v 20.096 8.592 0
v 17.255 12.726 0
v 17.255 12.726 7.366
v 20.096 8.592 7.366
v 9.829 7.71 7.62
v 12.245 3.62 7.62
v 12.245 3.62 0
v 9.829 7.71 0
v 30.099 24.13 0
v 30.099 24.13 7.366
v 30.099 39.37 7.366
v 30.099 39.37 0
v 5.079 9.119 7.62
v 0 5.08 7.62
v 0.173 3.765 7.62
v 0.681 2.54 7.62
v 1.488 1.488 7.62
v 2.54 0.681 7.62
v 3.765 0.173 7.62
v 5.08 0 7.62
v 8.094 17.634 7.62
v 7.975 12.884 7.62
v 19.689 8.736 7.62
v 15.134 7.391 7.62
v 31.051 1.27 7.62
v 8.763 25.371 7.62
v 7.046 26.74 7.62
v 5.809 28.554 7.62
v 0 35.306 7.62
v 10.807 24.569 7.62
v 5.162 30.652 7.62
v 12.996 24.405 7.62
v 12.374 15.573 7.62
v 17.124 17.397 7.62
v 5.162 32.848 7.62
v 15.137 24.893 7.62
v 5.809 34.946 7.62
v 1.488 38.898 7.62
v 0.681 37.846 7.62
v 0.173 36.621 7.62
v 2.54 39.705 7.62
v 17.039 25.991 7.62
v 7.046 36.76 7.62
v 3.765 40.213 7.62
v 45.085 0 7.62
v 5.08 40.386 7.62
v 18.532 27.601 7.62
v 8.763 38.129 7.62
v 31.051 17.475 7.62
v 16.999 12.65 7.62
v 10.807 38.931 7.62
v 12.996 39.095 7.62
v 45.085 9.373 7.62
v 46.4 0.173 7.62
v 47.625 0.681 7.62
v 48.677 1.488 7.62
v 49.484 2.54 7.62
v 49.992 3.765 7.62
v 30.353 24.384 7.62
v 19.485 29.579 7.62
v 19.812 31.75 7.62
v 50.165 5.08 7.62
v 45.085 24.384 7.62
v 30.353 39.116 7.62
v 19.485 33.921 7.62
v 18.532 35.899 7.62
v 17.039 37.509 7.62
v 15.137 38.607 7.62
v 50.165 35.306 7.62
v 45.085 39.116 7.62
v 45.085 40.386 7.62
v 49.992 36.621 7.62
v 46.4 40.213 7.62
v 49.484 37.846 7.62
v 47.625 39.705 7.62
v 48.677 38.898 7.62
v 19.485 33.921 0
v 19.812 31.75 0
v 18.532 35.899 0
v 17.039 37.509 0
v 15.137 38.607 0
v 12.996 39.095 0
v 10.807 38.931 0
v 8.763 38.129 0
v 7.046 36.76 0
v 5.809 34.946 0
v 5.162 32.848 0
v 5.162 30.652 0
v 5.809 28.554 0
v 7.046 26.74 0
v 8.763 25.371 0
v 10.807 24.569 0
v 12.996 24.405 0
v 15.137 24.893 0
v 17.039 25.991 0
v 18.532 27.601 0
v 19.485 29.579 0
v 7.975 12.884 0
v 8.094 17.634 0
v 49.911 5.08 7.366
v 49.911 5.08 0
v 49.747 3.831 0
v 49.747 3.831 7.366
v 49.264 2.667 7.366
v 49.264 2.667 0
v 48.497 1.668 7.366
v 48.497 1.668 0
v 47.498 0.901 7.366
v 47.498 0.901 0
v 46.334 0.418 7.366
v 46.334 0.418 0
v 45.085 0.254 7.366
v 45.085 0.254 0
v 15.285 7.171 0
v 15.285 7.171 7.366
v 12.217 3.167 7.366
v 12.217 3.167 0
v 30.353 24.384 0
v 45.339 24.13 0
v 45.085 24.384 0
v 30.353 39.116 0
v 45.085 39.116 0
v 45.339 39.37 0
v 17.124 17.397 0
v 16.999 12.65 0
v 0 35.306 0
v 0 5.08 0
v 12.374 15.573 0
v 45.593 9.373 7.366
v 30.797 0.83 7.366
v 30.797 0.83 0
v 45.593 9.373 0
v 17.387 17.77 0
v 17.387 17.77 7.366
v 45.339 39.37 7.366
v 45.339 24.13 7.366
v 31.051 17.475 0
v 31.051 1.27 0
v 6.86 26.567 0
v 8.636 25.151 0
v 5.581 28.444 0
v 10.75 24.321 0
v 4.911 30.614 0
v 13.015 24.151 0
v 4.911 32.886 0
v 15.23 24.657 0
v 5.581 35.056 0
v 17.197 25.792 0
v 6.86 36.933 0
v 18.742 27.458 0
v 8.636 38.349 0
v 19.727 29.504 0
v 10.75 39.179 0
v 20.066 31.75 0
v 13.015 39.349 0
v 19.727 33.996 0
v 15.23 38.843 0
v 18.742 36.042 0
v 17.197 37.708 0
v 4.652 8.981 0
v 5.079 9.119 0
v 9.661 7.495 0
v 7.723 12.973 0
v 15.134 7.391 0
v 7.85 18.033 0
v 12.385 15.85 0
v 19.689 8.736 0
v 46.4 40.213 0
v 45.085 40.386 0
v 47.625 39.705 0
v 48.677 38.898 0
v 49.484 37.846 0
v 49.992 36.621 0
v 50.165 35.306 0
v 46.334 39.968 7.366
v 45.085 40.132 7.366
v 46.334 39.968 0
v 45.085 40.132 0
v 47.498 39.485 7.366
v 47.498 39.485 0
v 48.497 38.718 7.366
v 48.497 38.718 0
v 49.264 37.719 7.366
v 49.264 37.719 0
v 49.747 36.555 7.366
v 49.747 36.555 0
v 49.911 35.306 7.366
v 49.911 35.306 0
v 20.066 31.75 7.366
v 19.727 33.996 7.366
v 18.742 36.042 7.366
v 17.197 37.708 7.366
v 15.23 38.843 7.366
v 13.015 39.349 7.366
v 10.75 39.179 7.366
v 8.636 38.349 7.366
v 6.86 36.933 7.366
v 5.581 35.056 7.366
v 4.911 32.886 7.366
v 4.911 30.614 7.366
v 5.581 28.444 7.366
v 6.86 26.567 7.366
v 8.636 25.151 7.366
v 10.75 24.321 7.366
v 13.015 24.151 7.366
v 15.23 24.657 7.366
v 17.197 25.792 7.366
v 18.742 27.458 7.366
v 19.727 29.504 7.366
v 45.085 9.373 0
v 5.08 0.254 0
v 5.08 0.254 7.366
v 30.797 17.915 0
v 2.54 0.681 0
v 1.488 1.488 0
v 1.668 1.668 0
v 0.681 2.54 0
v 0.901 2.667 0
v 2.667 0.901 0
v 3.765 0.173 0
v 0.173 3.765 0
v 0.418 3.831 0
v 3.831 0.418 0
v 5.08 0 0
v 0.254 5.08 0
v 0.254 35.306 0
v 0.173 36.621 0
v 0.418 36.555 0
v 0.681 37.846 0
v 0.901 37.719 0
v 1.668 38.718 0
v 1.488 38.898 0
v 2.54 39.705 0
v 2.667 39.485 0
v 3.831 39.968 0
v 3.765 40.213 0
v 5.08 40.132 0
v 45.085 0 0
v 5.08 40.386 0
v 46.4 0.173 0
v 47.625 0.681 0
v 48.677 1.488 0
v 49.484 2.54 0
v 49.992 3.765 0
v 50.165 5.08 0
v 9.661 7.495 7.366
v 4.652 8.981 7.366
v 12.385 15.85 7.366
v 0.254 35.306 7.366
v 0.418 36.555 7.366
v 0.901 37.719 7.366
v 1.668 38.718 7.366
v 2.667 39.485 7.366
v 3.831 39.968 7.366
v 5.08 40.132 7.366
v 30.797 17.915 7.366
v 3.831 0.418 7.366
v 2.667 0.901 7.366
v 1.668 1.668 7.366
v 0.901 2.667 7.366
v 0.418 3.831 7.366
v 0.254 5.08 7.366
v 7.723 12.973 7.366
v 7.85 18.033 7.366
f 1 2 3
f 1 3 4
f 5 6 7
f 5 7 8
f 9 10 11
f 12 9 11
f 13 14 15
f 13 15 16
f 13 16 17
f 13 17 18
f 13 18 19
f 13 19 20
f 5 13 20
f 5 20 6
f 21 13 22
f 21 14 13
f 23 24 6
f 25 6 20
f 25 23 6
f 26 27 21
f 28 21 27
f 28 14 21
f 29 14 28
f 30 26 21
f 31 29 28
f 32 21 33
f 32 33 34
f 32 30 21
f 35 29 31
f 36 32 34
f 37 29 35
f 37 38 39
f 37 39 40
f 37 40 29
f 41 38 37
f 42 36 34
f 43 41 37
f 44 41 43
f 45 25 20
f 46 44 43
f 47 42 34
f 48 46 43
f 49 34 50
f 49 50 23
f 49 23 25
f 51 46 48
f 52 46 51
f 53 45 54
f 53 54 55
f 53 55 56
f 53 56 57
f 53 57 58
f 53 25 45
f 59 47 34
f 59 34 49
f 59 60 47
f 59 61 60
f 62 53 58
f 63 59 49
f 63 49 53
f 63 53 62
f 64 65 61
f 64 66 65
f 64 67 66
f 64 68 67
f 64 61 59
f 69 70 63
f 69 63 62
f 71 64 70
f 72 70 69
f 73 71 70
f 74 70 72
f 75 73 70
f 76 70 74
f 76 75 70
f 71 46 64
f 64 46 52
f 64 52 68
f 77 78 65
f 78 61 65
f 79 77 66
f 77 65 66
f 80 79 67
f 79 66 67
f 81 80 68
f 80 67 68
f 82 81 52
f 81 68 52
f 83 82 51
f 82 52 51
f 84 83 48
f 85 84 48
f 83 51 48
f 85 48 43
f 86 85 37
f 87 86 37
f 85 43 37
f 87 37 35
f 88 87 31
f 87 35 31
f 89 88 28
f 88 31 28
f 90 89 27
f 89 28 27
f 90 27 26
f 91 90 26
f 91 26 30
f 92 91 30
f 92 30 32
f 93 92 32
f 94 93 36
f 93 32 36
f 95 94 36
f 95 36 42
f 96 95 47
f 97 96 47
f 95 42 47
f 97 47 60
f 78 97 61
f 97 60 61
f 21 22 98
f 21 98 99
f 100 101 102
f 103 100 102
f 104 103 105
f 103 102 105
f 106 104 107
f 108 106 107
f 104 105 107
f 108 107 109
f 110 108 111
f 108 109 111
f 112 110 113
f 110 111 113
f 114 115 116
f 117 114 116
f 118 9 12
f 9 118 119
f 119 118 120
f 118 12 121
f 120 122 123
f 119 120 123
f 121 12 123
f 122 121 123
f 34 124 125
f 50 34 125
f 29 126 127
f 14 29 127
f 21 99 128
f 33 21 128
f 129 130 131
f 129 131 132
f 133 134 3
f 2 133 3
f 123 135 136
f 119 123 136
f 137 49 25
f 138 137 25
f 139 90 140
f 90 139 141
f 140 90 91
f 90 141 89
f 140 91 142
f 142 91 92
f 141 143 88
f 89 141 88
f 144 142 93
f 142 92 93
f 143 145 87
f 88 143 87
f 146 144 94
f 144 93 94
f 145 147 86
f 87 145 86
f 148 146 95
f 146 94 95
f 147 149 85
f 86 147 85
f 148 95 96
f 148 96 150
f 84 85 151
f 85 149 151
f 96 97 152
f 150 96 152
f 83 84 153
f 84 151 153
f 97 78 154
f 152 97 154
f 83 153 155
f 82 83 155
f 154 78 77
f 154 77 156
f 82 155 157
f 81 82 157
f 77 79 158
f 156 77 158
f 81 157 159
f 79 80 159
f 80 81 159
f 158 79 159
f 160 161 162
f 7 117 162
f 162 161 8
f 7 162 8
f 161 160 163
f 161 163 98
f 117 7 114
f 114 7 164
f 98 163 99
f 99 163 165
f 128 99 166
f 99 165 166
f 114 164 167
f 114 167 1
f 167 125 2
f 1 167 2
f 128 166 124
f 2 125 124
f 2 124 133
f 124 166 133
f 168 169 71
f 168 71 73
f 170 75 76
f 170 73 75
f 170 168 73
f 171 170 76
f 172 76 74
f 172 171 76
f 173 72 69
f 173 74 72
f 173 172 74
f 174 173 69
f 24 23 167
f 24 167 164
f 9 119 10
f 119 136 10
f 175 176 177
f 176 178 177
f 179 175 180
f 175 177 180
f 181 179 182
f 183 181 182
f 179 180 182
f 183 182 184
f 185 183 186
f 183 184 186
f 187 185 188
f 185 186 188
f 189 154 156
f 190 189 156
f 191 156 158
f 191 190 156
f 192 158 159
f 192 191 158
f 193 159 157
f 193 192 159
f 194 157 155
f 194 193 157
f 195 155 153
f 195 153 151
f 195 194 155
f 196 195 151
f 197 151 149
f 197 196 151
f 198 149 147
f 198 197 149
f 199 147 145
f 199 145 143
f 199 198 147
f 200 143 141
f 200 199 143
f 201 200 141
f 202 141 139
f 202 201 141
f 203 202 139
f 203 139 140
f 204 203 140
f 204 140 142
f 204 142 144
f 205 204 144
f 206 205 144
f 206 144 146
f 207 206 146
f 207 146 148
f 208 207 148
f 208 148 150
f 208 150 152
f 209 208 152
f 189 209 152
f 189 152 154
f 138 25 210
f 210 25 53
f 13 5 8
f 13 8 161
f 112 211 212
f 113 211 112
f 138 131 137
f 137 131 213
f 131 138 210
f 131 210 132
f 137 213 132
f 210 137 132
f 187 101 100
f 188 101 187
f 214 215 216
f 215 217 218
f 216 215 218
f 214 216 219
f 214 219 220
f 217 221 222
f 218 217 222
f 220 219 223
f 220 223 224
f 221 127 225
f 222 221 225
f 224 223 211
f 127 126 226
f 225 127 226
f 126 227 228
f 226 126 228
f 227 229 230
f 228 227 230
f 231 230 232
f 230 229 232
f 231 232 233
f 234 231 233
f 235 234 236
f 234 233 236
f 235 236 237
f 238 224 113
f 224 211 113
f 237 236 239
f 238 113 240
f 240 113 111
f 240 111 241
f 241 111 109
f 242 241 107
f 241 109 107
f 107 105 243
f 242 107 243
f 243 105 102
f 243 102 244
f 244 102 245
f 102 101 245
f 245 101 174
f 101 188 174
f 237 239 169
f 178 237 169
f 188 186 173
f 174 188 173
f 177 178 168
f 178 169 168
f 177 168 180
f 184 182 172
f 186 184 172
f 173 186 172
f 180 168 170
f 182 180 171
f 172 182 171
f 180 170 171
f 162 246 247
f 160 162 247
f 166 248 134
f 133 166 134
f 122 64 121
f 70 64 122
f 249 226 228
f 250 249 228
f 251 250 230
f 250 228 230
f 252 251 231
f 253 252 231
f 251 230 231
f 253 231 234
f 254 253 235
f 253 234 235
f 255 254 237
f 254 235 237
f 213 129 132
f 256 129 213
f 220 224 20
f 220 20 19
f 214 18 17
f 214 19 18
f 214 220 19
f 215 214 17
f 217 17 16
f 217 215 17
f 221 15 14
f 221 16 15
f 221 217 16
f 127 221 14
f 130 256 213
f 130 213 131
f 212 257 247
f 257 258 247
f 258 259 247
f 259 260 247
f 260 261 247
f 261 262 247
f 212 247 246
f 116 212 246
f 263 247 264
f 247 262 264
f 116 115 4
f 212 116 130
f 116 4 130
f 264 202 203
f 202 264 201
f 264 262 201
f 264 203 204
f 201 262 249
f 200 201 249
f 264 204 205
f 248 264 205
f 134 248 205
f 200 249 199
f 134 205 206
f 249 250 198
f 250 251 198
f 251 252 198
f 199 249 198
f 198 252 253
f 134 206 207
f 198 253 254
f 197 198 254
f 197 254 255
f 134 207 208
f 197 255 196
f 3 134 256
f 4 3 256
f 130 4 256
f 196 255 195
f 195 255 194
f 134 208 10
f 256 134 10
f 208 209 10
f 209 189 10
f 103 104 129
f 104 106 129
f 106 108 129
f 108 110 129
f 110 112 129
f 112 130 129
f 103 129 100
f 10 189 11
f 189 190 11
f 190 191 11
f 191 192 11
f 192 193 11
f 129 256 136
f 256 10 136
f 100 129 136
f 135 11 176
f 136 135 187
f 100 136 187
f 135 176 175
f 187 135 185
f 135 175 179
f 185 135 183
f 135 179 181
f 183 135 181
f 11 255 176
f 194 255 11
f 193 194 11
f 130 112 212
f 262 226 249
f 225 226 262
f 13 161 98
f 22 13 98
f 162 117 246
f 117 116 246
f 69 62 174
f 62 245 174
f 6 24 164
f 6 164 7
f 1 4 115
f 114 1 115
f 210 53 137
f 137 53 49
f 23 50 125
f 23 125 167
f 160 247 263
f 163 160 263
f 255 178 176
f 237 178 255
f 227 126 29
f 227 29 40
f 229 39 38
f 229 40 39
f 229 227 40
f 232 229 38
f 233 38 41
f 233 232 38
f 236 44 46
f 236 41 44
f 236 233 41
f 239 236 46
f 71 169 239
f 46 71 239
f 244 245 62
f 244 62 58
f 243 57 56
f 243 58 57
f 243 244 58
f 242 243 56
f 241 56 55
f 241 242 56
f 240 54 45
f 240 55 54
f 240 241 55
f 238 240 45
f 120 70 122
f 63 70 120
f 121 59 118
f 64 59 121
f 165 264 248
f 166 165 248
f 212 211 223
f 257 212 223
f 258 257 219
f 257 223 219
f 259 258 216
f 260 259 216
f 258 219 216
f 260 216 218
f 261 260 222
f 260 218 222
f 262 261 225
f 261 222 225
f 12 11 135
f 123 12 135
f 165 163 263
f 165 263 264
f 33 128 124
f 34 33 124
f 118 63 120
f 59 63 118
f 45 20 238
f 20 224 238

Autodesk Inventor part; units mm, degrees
ref_plane "YZ Plane" through (0, 0, 0) normal (1, 0, 0) x (0, 1, 0)
ref_plane "XZ Plane" through (0, 0, 0) normal (0, 1, 0) x (-1, 0, 0)
ref_plane "XY Plane" through (0, 0, 0) normal (0, 0, 1) x (1, 0, 0)
sketch "Sketch1" plane through (0, 0, 0) normal (0, 0, 1) x (1, 0, 0)
  line L0 (5.08, 0) -> (45.085, 0)
  line L1 (50.165, 5.08) -> (50.165, 35.306)
  line L2 (45.085, 40.386) -> (5.08, 40.386)
  line L3 (0, 35.306) -> (0, 5.08)
  arc A0 (5.08, 40.386) -> (0, 35.306) centre (5.08, 35.306) ccw
  arc A1 (0, 5.08) -> (5.08, 0) centre (5.08, 5.08) ccw
  arc A2 (45.085, 0) -> (50.165, 5.08) centre (45.085, 5.08) ccw
  arc A3 (50.165, 35.306) -> (45.085, 40.386) centre (45.085, 35.306) ccw
  point P0 (0, 0)
  point P1 (50.165, 0)
  point P2 (50.165, 40.386)
  dimension "d0" = 50.165
  dimension "d1" = 40.386
  dimension "d2" = 5.08
extrude "Extrusion1" add sketch "Sketch1" along normal blind 7.62
sketch "Sketch2" plane through (0, 0, 7.62) normal (0, 0, 1) x (1, 0, 0)
  line L0 (0, 35.306) -> (0, 5.08) projected
  arc A0 (0, 5.08) -> (5.08, 0) centre (5.08, 5.08) ccw projected
  line L1 (5.08, 0) -> (45.085, 0) projected
  arc A1 (45.085, 0) -> (50.165, 5.08) centre (45.085, 5.08) ccw projected
  line L2 (50.165, 5.08) -> (50.165, 35.306) projected
  arc A2 (50.165, 35.306) -> (45.085, 40.386) centre (45.085, 35.306) ccw projected
  line L3 (45.085, 40.386) -> (5.08, 40.386) projected
  arc A3 (5.08, 40.386) -> (0, 35.306) centre (5.08, 35.306) ccw projected
  line L4 (45.085, 40.386) -> (5.08, 40.386) projected
  circle A4 centre (12.446, 31.75) radius 7.366
  line L5 (30.353, 39.116) -> (45.085, 39.116)
  line L6 (45.085, 39.116) -> (45.085, 24.384)
  line L7 (45.085, 24.384) -> (30.353, 24.384)
  line L8 (30.353, 24.384) -> (30.353, 39.116)
  line L9 (31.0509, 17.4752) -> (31.0509, 1.27)
  line L10 (31.0509, 1.27) -> (45.085, 9.3726)
  line L11 (45.085, 9.3726) -> (31.0509, 17.4752)
  circle A5 centre (12.446, 11.3013) radius 7.6835 construction
  line L12 (19.6887, 8.7364) -> (12.2447, 3.6204) construction
  line L13 (12.2447, 3.6204) -> (5.0789, 9.1192) construction
  line L14 (5.0789, 9.1192) -> (8.0941, 17.6336) construction
  line L15 (8.0941, 17.6336) -> (17.1235, 17.397) construction
  line L16 (17.1235, 17.397) -> (19.6887, 8.7364) construction
  line L17 (8.0941, 17.6336) -> (12.3737, 15.5731)
  line L18 (12.3737, 15.5731) -> (17.1235, 17.397)
  line L19 (17.1235, 17.397) -> (16.9991, 12.6499)
  line L20 (16.9991, 12.6499) -> (19.6887, 8.7364)
  line L21 (19.6887, 8.7364) -> (15.1335, 7.3908)
  line L22 (15.1335, 7.3908) -> (12.2447, 3.6204)
  line L23 (12.2447, 3.6204) -> (9.8287, 7.7099)
  line L24 (9.8287, 7.7099) -> (5.0789, 9.1192)
  line L25 (5.0789, 9.1192) -> (7.9752, 12.8838)
  line L26 (7.9752, 12.8838) -> (8.0941, 17.6336)
  point P0 (0, 0)
  dimension "d21" = 15.367
  dimension "d10" = 14.732
  dimension "d11" = 1.27
  dimension "d12" = 5.08
  dimension "d13" = 14.732
  dimension "d14" = 14.732
  dimension "d15" = 14.732
  dimension "d16" = 5.08
  dimension "d17" = 1.27
  dimension "d18" = 16.2052
  dimension "d19" = 5.08
  dimension "d20" = 1.27
  dimension "d23" = 4.7498
  dimension "d25" = 4.7498
  dimension "d26" = 4.7498
  dimension "d27" = 4.7498
  dimension "d28" = 4.7498
  dimension "d29" = 4.7498
  dimension "d30" = 4.7498
  dimension "d31" = 4.7498
  dimension "d32" = 4.747
  dimension "d33" = 3.9135
extrude "Extrusion2" cut sketch "Sketch2" against normal blind 7.62 contours A4 | L5 L6 L7 L8 | L11 L10 L9 | L17 L18 L19 L20 L21 L22 L23 L24 L25 L26
shell "Shell1" thickness 0.254 removed faces 1 at (40.407, 17.0773, 0)
properties part number "Passenger Base EM" material "Wood (Birch)"
